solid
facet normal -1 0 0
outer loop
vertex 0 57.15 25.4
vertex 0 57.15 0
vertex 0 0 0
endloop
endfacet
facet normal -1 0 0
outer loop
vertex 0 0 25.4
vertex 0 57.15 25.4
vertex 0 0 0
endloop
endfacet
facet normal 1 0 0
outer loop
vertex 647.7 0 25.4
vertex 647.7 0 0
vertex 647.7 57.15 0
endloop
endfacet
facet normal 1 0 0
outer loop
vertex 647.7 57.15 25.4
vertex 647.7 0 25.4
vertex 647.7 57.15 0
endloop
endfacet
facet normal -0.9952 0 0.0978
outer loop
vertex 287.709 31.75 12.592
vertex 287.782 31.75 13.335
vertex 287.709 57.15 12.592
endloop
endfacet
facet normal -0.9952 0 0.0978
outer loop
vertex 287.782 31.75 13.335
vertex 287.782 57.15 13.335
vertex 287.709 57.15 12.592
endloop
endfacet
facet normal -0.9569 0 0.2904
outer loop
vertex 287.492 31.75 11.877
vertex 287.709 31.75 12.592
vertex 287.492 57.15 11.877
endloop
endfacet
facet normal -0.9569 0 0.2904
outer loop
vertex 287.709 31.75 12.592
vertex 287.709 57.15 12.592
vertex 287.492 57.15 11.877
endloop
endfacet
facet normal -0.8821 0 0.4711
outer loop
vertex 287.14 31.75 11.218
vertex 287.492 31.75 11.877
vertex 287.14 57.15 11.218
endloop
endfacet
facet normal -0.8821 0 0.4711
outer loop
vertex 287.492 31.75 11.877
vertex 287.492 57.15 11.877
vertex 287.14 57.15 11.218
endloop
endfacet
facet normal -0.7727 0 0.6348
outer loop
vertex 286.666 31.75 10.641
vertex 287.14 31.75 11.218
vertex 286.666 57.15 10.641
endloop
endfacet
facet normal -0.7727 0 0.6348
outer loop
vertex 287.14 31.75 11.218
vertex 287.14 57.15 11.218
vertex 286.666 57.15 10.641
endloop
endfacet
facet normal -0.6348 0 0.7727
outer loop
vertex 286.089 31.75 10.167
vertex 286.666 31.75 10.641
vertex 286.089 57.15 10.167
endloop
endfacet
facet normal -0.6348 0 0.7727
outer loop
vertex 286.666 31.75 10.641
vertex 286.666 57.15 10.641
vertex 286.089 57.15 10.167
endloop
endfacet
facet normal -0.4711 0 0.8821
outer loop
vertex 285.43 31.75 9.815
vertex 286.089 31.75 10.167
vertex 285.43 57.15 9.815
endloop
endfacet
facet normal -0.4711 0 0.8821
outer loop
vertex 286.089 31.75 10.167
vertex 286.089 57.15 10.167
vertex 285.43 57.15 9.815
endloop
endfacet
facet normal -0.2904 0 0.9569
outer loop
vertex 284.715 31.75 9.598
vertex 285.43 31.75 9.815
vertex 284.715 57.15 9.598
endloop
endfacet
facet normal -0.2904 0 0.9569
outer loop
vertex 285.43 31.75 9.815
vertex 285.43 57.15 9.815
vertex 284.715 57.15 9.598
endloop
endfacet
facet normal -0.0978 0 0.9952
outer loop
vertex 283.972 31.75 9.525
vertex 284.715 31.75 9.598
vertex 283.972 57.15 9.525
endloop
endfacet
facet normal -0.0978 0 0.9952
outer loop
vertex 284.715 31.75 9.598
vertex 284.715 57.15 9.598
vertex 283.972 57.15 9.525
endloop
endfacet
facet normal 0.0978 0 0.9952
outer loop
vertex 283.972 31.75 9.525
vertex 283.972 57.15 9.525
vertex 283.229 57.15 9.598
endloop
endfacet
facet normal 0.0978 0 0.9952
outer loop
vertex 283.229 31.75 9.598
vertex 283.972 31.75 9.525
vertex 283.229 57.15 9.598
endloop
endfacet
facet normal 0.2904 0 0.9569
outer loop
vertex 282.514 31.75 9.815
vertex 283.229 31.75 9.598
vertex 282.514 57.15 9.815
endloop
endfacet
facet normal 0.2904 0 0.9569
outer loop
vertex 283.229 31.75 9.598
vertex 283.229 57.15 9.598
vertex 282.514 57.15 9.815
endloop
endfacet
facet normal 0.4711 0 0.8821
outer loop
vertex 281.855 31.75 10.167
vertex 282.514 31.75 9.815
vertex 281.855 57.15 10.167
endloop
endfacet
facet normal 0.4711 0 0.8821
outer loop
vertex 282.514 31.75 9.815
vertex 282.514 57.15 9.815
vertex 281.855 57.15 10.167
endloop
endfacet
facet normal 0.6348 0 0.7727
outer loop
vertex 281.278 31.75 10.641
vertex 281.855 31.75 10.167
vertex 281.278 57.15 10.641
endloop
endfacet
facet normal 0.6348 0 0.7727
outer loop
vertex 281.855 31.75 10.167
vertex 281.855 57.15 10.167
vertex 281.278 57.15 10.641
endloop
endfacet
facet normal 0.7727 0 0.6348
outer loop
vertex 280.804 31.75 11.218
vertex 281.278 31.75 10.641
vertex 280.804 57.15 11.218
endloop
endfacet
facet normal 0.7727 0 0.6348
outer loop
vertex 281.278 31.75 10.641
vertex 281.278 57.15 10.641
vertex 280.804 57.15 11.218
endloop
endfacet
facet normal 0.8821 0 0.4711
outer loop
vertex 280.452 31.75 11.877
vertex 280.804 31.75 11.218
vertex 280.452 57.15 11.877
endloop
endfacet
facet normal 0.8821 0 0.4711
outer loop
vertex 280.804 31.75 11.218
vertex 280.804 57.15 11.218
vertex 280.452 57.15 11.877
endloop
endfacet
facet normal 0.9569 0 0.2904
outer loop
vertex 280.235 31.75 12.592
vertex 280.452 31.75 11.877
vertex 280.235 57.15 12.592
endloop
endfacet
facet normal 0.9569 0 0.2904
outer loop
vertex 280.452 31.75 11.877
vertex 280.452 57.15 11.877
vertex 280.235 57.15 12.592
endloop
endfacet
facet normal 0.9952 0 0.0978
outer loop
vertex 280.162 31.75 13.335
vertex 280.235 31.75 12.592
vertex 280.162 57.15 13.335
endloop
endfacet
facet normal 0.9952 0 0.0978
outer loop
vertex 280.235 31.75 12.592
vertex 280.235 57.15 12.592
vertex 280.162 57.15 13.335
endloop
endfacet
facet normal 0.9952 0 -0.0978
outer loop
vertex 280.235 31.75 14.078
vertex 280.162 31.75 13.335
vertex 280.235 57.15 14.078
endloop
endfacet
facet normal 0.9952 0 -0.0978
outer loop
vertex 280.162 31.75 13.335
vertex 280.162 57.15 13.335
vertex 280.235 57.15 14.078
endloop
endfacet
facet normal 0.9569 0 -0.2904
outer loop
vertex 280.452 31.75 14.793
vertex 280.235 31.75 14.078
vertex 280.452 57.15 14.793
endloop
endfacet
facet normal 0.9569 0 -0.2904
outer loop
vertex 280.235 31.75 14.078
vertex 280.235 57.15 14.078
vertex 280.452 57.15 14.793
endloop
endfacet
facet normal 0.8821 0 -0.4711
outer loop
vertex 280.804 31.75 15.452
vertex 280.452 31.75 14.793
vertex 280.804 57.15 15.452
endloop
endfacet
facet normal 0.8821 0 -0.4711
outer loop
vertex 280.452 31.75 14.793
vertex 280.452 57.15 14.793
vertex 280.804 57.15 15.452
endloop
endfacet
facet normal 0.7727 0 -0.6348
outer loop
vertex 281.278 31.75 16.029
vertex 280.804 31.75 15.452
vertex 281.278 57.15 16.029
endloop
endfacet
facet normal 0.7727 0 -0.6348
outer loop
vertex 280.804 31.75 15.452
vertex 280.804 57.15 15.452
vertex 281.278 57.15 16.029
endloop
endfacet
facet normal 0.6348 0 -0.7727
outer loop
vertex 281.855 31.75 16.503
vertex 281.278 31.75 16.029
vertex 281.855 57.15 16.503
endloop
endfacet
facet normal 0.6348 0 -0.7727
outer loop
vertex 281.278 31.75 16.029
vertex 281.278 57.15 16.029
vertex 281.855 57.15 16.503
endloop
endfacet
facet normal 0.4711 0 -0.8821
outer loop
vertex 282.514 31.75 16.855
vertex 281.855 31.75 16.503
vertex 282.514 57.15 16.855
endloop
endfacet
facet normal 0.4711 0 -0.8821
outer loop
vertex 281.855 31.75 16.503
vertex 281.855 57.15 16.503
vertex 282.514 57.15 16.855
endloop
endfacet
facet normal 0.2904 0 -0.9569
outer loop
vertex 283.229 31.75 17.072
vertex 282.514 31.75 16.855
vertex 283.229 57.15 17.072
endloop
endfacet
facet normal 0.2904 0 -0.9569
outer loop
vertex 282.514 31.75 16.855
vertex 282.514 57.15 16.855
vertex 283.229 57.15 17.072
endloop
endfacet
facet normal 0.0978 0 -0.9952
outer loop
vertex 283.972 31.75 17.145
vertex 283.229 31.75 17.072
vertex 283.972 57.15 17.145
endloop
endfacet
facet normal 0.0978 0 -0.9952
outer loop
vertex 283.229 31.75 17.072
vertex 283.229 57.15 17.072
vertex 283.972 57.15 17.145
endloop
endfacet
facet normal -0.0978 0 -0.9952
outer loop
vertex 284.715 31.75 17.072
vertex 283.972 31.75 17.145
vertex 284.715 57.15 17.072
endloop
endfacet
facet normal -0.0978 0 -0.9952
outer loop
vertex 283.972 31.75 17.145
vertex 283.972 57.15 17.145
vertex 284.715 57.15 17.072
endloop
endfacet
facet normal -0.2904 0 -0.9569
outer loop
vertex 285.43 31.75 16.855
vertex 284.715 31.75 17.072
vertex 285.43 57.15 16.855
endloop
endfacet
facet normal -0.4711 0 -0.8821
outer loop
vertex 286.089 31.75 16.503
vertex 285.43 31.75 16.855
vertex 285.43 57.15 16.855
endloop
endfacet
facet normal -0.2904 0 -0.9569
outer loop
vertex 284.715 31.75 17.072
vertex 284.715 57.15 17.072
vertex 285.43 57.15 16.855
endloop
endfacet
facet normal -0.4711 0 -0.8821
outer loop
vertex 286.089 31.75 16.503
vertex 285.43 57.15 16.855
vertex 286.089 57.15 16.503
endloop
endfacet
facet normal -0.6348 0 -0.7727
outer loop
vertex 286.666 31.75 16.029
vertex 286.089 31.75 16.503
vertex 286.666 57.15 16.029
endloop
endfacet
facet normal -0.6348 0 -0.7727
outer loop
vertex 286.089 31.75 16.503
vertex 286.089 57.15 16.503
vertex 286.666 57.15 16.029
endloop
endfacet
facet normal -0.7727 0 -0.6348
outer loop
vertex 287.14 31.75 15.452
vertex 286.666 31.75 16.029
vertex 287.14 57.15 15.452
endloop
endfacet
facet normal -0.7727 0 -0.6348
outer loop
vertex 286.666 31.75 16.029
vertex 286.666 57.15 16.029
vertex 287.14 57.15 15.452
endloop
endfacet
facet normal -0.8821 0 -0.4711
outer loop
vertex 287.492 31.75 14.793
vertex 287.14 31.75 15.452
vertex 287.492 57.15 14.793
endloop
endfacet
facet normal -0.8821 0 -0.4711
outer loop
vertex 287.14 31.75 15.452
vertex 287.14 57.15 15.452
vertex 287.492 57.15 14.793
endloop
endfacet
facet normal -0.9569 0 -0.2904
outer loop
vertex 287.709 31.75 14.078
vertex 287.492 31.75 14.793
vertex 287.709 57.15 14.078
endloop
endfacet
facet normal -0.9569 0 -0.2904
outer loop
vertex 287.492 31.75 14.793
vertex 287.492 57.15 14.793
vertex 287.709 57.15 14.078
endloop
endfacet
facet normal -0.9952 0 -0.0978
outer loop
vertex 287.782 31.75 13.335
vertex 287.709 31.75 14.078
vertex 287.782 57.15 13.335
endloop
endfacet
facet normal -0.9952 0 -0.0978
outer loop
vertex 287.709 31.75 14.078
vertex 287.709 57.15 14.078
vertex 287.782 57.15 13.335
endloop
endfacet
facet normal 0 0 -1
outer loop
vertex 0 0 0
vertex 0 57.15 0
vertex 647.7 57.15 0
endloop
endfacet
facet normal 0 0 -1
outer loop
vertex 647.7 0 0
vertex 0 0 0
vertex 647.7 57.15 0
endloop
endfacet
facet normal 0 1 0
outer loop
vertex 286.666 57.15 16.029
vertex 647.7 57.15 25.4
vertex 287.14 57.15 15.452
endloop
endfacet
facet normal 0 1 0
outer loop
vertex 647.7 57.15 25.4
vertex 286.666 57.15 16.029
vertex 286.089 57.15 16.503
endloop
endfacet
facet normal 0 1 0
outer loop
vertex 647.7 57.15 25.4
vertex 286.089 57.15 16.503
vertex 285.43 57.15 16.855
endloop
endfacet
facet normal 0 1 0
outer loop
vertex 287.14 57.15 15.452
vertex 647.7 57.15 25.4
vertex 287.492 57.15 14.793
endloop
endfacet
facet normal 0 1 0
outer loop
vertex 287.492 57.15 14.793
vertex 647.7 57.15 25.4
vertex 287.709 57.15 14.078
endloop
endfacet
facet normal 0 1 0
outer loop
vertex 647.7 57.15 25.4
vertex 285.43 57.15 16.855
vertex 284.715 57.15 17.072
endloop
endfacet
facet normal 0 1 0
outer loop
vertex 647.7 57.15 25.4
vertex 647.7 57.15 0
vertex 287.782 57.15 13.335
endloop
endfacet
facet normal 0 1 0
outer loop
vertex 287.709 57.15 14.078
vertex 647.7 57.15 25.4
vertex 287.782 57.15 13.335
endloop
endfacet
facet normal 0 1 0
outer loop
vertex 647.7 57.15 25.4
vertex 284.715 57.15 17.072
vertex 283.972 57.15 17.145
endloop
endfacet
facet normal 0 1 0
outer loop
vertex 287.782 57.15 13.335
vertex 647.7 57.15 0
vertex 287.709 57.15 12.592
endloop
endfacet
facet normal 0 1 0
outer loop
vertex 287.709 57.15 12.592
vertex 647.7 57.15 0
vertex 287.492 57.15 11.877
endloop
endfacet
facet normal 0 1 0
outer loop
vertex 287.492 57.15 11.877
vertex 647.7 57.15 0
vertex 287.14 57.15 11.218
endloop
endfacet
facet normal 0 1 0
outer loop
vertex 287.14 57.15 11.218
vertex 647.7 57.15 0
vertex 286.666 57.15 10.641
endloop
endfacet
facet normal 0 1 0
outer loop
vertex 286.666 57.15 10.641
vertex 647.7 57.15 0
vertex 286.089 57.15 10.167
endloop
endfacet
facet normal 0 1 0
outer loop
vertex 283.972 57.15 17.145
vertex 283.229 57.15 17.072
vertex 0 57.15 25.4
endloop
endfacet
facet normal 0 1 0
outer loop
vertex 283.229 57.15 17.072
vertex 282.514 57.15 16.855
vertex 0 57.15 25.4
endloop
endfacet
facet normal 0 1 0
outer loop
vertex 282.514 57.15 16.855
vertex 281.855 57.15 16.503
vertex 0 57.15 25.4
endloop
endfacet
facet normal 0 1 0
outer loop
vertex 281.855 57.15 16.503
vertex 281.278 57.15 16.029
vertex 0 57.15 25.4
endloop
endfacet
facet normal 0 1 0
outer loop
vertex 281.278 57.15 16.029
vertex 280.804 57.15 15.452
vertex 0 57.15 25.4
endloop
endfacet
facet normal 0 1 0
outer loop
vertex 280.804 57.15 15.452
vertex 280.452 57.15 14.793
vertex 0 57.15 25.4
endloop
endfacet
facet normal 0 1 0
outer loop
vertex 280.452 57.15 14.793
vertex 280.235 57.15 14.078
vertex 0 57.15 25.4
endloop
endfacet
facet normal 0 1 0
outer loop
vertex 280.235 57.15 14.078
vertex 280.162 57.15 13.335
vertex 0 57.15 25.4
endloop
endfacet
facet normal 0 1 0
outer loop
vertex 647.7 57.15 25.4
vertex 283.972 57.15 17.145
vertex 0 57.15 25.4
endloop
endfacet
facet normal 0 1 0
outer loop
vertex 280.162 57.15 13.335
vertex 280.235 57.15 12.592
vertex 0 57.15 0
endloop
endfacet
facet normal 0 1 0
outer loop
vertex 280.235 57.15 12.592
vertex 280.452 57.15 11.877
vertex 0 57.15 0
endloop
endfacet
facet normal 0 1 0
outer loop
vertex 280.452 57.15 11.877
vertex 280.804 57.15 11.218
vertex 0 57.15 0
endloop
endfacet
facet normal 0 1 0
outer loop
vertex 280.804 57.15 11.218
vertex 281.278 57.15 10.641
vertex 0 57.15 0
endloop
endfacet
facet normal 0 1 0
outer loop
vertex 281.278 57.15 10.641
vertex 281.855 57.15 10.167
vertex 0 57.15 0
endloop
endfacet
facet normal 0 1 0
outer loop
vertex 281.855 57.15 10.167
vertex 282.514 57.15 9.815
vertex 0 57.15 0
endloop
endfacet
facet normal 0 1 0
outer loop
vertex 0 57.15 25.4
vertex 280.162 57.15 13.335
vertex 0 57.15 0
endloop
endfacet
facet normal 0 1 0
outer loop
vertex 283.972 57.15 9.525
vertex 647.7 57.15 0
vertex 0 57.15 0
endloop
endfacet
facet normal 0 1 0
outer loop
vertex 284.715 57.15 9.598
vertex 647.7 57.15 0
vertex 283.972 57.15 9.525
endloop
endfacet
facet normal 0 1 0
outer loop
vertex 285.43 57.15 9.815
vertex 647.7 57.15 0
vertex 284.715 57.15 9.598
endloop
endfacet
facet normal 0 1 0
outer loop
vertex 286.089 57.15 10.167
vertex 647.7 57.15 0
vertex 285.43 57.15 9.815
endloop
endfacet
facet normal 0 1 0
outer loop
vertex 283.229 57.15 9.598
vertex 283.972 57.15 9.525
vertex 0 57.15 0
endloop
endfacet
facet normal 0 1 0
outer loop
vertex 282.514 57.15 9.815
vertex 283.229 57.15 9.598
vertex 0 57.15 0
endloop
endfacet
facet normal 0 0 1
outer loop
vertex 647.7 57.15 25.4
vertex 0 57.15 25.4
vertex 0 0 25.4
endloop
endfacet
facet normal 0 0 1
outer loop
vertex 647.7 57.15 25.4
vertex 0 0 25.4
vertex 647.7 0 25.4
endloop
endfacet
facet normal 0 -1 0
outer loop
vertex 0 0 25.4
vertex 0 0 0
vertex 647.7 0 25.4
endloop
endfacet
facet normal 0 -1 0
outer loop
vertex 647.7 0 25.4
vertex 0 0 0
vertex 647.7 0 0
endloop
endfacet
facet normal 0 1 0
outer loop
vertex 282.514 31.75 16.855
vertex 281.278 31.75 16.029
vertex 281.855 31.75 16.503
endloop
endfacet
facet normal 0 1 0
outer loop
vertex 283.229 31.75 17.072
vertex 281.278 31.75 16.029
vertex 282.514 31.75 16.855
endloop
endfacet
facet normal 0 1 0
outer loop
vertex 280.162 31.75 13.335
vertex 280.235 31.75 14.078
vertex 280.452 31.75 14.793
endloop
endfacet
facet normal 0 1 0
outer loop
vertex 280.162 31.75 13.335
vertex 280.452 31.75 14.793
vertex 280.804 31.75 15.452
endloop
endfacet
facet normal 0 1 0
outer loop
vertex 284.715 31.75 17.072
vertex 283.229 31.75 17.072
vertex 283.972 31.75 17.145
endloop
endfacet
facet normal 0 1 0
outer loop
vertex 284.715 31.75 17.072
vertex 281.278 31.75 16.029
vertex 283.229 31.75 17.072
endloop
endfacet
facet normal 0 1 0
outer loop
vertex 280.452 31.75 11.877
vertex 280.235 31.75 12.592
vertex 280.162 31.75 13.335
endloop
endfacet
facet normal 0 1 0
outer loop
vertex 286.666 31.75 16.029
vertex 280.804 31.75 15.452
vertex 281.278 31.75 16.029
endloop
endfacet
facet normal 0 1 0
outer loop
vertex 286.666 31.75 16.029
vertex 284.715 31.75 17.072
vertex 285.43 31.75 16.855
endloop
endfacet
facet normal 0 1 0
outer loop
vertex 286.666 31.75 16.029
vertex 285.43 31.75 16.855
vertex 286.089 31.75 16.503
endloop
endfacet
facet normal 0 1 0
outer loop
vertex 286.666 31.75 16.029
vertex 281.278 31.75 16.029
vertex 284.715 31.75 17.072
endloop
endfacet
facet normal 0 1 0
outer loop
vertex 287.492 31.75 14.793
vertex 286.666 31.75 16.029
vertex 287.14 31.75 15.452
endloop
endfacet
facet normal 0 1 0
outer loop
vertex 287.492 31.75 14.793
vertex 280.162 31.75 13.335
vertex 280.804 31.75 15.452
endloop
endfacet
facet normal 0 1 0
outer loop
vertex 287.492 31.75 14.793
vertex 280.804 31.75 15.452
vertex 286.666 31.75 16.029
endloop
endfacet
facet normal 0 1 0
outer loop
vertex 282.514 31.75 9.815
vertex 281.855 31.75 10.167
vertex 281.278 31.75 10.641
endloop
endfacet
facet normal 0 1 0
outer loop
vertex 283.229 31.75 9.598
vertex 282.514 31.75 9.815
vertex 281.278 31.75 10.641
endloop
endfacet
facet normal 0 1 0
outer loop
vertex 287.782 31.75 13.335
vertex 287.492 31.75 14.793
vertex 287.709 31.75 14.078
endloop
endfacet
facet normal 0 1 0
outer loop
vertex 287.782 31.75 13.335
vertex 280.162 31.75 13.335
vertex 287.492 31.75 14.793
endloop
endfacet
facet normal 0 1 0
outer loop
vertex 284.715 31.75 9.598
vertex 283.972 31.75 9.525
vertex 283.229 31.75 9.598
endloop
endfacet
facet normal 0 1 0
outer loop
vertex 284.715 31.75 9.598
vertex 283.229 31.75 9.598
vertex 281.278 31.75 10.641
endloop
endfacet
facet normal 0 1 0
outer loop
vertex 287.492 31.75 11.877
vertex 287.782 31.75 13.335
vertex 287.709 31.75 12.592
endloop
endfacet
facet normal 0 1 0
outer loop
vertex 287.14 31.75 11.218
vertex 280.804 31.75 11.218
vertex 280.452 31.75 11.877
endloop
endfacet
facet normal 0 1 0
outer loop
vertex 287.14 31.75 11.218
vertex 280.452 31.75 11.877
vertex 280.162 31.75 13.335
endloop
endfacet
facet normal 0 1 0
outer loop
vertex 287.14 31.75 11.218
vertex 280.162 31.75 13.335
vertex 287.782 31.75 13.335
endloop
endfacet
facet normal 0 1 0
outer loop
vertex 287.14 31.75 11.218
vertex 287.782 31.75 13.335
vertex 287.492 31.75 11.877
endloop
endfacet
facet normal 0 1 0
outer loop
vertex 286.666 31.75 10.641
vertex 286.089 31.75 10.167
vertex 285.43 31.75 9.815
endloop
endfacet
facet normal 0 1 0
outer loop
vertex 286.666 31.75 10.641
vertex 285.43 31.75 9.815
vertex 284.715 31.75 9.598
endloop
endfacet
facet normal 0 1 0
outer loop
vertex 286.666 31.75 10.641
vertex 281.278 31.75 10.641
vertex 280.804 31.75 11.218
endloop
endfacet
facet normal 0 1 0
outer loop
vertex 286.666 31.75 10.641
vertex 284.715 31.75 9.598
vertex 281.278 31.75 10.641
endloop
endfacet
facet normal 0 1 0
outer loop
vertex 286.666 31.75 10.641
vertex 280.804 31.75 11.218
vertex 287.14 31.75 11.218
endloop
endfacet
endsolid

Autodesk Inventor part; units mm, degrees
ref_plane "YZ Plane" through (0, 0, 0) normal (1, 0, 0) x (0, 1, 0)
ref_plane "XZ Plane" through (0, 0, 0) normal (0, 1, 0) x (-1, 0, 0)
ref_plane "XY Plane" through (0, 0, 0) normal (0, 0, 1) x (1, 0, 0)
sketch "Sketch1" plane through (0, 0, 0) normal (0, 0, 1) x (1, 0, 0)
  line L0 (0, 0) -> (647.7, 0)
  line L1 (647.7, 0) -> (647.7, 57.15)
  line L2 (647.7, 57.15) -> (0, 57.15)
  line L3 (0, 57.15) -> (0, 0)
  line L4 (647.7, 0) -> (647.7, 57.15)
  dimension "d0" = 647.7
  dimension "d1" = 57.15
extrude "Extrusion1" add sketch "Sketch1" along normal blind 25.4
sketch "Sketch2" plane through (0, 0, 25.4) normal (0, 0, 1) x (1, 0, 0)
  line L0 (0, 0) -> (647.7, 0) projected
  line L1 (901.7, 0) -> (901.7, 25.4)
  line L2 (901.7, 25.4) -> (880.1227, 25.4)
  circle A0 centre (880.1227, 25.4) radius 17.399
  line L3 (880.1227, 25.4) -> (836.9681, 25.4)
  circle A1 centre (836.9681, 25.4) radius 17.399
  line L4 (836.9681, 25.4) -> (793.8135, 25.4)
  line L5 (793.8135, 25.4) -> (750.6589, 25.4)
  line L6 (750.6589, 25.4) -> (707.5043, 25.4)
  circle A2 centre (793.8135, 25.4) radius 17.399
  circle A3 centre (750.6589, 25.4) radius 17.399
  circle A4 centre (707.5043, 25.4) radius 17.399
  line L7 (901.7, 0) -> (901.7, 57.15) projected
  line L8 (901.7, 0) -> (901.7, 57.15)
  line L9 (707.5043, 25.4) -> (664.3497, 25.4)
  circle A5 centre (664.3497, 25.4) radius 9.525
  point P0 (787.6658, 25.1497)
  point P1 (813.0658, 25.1497)
  point P2 (838.4658, 25.1497)
  point P3 (863.8658, 25.1497)
  dimension "d7" = 25.4
  dimension "d8" = 21.5773
  dimension "d9" = 34.798
  dimension "d10" = 43.1546
  dimension "d13" = 19.05
extrude "Extrusion2" [suppressed]
sketch "Sketch3" plane through (0, 57.15, 0) normal (0, 1, 0) x (1, 0, 0)
  line L0 (0, 0) -> (0, -25.4) projected
  line L1 (0, 0) -> (283.972, 0)
  line L2 (283.972, 0) -> (283.972, -13.335)
  line L3 (283.972, -13.335) -> (0, -13.335)
  line L4 (0, -13.335) -> (0, 0)
  circle A0 centre (283.972, -13.335) radius 3.81
  dimension "d14" = 283.972
  dimension "d15" = 13.335
  dimension "d16" = 7.62
extrude "Extrusion3" cut sketch "Sketch3" against normal blind 25.4 contours A0 L2 L3 | L3 L2 A0
equation "\"d0\" = bodyLengthUntilNut"
equation "\"d1\" = bodyHeight"
equation "\"d5\" = woodThickness"
equation "\"d7\" = motorHolesOffset"
equation "\"d8\" = motorHoleEndOffset"
equation "\"d9\" = motorHoleDiameter"
equation "\"d10\" = motorHoleSeparation"
equation "\"d13\" = wireHoleDiameter"
equation "\"bodyLengthUntilNut\" = 647.7"
equation "\"postNutAngle\" = 0"
equation "\"woodThickness\" = 25.4"
equation "\"slantLength\" = 127"
equation "\"extensionLength\" = 254"
equation "\"bodyHeight\" = 57.15"
equation "\"motorHolesOffset\" = 25.4"
equation "\"motorHoleEndOffset\" = 21.5773"
equation "\"motorHoleDiameter\" = 34.798"
equation "\"motorHoleSeparation\" = 43.1546"
equation "\"wireHoleDiameter\" = 19.05"
equation "\"temp\" = 0"
properties part number "bodySidePlate"
